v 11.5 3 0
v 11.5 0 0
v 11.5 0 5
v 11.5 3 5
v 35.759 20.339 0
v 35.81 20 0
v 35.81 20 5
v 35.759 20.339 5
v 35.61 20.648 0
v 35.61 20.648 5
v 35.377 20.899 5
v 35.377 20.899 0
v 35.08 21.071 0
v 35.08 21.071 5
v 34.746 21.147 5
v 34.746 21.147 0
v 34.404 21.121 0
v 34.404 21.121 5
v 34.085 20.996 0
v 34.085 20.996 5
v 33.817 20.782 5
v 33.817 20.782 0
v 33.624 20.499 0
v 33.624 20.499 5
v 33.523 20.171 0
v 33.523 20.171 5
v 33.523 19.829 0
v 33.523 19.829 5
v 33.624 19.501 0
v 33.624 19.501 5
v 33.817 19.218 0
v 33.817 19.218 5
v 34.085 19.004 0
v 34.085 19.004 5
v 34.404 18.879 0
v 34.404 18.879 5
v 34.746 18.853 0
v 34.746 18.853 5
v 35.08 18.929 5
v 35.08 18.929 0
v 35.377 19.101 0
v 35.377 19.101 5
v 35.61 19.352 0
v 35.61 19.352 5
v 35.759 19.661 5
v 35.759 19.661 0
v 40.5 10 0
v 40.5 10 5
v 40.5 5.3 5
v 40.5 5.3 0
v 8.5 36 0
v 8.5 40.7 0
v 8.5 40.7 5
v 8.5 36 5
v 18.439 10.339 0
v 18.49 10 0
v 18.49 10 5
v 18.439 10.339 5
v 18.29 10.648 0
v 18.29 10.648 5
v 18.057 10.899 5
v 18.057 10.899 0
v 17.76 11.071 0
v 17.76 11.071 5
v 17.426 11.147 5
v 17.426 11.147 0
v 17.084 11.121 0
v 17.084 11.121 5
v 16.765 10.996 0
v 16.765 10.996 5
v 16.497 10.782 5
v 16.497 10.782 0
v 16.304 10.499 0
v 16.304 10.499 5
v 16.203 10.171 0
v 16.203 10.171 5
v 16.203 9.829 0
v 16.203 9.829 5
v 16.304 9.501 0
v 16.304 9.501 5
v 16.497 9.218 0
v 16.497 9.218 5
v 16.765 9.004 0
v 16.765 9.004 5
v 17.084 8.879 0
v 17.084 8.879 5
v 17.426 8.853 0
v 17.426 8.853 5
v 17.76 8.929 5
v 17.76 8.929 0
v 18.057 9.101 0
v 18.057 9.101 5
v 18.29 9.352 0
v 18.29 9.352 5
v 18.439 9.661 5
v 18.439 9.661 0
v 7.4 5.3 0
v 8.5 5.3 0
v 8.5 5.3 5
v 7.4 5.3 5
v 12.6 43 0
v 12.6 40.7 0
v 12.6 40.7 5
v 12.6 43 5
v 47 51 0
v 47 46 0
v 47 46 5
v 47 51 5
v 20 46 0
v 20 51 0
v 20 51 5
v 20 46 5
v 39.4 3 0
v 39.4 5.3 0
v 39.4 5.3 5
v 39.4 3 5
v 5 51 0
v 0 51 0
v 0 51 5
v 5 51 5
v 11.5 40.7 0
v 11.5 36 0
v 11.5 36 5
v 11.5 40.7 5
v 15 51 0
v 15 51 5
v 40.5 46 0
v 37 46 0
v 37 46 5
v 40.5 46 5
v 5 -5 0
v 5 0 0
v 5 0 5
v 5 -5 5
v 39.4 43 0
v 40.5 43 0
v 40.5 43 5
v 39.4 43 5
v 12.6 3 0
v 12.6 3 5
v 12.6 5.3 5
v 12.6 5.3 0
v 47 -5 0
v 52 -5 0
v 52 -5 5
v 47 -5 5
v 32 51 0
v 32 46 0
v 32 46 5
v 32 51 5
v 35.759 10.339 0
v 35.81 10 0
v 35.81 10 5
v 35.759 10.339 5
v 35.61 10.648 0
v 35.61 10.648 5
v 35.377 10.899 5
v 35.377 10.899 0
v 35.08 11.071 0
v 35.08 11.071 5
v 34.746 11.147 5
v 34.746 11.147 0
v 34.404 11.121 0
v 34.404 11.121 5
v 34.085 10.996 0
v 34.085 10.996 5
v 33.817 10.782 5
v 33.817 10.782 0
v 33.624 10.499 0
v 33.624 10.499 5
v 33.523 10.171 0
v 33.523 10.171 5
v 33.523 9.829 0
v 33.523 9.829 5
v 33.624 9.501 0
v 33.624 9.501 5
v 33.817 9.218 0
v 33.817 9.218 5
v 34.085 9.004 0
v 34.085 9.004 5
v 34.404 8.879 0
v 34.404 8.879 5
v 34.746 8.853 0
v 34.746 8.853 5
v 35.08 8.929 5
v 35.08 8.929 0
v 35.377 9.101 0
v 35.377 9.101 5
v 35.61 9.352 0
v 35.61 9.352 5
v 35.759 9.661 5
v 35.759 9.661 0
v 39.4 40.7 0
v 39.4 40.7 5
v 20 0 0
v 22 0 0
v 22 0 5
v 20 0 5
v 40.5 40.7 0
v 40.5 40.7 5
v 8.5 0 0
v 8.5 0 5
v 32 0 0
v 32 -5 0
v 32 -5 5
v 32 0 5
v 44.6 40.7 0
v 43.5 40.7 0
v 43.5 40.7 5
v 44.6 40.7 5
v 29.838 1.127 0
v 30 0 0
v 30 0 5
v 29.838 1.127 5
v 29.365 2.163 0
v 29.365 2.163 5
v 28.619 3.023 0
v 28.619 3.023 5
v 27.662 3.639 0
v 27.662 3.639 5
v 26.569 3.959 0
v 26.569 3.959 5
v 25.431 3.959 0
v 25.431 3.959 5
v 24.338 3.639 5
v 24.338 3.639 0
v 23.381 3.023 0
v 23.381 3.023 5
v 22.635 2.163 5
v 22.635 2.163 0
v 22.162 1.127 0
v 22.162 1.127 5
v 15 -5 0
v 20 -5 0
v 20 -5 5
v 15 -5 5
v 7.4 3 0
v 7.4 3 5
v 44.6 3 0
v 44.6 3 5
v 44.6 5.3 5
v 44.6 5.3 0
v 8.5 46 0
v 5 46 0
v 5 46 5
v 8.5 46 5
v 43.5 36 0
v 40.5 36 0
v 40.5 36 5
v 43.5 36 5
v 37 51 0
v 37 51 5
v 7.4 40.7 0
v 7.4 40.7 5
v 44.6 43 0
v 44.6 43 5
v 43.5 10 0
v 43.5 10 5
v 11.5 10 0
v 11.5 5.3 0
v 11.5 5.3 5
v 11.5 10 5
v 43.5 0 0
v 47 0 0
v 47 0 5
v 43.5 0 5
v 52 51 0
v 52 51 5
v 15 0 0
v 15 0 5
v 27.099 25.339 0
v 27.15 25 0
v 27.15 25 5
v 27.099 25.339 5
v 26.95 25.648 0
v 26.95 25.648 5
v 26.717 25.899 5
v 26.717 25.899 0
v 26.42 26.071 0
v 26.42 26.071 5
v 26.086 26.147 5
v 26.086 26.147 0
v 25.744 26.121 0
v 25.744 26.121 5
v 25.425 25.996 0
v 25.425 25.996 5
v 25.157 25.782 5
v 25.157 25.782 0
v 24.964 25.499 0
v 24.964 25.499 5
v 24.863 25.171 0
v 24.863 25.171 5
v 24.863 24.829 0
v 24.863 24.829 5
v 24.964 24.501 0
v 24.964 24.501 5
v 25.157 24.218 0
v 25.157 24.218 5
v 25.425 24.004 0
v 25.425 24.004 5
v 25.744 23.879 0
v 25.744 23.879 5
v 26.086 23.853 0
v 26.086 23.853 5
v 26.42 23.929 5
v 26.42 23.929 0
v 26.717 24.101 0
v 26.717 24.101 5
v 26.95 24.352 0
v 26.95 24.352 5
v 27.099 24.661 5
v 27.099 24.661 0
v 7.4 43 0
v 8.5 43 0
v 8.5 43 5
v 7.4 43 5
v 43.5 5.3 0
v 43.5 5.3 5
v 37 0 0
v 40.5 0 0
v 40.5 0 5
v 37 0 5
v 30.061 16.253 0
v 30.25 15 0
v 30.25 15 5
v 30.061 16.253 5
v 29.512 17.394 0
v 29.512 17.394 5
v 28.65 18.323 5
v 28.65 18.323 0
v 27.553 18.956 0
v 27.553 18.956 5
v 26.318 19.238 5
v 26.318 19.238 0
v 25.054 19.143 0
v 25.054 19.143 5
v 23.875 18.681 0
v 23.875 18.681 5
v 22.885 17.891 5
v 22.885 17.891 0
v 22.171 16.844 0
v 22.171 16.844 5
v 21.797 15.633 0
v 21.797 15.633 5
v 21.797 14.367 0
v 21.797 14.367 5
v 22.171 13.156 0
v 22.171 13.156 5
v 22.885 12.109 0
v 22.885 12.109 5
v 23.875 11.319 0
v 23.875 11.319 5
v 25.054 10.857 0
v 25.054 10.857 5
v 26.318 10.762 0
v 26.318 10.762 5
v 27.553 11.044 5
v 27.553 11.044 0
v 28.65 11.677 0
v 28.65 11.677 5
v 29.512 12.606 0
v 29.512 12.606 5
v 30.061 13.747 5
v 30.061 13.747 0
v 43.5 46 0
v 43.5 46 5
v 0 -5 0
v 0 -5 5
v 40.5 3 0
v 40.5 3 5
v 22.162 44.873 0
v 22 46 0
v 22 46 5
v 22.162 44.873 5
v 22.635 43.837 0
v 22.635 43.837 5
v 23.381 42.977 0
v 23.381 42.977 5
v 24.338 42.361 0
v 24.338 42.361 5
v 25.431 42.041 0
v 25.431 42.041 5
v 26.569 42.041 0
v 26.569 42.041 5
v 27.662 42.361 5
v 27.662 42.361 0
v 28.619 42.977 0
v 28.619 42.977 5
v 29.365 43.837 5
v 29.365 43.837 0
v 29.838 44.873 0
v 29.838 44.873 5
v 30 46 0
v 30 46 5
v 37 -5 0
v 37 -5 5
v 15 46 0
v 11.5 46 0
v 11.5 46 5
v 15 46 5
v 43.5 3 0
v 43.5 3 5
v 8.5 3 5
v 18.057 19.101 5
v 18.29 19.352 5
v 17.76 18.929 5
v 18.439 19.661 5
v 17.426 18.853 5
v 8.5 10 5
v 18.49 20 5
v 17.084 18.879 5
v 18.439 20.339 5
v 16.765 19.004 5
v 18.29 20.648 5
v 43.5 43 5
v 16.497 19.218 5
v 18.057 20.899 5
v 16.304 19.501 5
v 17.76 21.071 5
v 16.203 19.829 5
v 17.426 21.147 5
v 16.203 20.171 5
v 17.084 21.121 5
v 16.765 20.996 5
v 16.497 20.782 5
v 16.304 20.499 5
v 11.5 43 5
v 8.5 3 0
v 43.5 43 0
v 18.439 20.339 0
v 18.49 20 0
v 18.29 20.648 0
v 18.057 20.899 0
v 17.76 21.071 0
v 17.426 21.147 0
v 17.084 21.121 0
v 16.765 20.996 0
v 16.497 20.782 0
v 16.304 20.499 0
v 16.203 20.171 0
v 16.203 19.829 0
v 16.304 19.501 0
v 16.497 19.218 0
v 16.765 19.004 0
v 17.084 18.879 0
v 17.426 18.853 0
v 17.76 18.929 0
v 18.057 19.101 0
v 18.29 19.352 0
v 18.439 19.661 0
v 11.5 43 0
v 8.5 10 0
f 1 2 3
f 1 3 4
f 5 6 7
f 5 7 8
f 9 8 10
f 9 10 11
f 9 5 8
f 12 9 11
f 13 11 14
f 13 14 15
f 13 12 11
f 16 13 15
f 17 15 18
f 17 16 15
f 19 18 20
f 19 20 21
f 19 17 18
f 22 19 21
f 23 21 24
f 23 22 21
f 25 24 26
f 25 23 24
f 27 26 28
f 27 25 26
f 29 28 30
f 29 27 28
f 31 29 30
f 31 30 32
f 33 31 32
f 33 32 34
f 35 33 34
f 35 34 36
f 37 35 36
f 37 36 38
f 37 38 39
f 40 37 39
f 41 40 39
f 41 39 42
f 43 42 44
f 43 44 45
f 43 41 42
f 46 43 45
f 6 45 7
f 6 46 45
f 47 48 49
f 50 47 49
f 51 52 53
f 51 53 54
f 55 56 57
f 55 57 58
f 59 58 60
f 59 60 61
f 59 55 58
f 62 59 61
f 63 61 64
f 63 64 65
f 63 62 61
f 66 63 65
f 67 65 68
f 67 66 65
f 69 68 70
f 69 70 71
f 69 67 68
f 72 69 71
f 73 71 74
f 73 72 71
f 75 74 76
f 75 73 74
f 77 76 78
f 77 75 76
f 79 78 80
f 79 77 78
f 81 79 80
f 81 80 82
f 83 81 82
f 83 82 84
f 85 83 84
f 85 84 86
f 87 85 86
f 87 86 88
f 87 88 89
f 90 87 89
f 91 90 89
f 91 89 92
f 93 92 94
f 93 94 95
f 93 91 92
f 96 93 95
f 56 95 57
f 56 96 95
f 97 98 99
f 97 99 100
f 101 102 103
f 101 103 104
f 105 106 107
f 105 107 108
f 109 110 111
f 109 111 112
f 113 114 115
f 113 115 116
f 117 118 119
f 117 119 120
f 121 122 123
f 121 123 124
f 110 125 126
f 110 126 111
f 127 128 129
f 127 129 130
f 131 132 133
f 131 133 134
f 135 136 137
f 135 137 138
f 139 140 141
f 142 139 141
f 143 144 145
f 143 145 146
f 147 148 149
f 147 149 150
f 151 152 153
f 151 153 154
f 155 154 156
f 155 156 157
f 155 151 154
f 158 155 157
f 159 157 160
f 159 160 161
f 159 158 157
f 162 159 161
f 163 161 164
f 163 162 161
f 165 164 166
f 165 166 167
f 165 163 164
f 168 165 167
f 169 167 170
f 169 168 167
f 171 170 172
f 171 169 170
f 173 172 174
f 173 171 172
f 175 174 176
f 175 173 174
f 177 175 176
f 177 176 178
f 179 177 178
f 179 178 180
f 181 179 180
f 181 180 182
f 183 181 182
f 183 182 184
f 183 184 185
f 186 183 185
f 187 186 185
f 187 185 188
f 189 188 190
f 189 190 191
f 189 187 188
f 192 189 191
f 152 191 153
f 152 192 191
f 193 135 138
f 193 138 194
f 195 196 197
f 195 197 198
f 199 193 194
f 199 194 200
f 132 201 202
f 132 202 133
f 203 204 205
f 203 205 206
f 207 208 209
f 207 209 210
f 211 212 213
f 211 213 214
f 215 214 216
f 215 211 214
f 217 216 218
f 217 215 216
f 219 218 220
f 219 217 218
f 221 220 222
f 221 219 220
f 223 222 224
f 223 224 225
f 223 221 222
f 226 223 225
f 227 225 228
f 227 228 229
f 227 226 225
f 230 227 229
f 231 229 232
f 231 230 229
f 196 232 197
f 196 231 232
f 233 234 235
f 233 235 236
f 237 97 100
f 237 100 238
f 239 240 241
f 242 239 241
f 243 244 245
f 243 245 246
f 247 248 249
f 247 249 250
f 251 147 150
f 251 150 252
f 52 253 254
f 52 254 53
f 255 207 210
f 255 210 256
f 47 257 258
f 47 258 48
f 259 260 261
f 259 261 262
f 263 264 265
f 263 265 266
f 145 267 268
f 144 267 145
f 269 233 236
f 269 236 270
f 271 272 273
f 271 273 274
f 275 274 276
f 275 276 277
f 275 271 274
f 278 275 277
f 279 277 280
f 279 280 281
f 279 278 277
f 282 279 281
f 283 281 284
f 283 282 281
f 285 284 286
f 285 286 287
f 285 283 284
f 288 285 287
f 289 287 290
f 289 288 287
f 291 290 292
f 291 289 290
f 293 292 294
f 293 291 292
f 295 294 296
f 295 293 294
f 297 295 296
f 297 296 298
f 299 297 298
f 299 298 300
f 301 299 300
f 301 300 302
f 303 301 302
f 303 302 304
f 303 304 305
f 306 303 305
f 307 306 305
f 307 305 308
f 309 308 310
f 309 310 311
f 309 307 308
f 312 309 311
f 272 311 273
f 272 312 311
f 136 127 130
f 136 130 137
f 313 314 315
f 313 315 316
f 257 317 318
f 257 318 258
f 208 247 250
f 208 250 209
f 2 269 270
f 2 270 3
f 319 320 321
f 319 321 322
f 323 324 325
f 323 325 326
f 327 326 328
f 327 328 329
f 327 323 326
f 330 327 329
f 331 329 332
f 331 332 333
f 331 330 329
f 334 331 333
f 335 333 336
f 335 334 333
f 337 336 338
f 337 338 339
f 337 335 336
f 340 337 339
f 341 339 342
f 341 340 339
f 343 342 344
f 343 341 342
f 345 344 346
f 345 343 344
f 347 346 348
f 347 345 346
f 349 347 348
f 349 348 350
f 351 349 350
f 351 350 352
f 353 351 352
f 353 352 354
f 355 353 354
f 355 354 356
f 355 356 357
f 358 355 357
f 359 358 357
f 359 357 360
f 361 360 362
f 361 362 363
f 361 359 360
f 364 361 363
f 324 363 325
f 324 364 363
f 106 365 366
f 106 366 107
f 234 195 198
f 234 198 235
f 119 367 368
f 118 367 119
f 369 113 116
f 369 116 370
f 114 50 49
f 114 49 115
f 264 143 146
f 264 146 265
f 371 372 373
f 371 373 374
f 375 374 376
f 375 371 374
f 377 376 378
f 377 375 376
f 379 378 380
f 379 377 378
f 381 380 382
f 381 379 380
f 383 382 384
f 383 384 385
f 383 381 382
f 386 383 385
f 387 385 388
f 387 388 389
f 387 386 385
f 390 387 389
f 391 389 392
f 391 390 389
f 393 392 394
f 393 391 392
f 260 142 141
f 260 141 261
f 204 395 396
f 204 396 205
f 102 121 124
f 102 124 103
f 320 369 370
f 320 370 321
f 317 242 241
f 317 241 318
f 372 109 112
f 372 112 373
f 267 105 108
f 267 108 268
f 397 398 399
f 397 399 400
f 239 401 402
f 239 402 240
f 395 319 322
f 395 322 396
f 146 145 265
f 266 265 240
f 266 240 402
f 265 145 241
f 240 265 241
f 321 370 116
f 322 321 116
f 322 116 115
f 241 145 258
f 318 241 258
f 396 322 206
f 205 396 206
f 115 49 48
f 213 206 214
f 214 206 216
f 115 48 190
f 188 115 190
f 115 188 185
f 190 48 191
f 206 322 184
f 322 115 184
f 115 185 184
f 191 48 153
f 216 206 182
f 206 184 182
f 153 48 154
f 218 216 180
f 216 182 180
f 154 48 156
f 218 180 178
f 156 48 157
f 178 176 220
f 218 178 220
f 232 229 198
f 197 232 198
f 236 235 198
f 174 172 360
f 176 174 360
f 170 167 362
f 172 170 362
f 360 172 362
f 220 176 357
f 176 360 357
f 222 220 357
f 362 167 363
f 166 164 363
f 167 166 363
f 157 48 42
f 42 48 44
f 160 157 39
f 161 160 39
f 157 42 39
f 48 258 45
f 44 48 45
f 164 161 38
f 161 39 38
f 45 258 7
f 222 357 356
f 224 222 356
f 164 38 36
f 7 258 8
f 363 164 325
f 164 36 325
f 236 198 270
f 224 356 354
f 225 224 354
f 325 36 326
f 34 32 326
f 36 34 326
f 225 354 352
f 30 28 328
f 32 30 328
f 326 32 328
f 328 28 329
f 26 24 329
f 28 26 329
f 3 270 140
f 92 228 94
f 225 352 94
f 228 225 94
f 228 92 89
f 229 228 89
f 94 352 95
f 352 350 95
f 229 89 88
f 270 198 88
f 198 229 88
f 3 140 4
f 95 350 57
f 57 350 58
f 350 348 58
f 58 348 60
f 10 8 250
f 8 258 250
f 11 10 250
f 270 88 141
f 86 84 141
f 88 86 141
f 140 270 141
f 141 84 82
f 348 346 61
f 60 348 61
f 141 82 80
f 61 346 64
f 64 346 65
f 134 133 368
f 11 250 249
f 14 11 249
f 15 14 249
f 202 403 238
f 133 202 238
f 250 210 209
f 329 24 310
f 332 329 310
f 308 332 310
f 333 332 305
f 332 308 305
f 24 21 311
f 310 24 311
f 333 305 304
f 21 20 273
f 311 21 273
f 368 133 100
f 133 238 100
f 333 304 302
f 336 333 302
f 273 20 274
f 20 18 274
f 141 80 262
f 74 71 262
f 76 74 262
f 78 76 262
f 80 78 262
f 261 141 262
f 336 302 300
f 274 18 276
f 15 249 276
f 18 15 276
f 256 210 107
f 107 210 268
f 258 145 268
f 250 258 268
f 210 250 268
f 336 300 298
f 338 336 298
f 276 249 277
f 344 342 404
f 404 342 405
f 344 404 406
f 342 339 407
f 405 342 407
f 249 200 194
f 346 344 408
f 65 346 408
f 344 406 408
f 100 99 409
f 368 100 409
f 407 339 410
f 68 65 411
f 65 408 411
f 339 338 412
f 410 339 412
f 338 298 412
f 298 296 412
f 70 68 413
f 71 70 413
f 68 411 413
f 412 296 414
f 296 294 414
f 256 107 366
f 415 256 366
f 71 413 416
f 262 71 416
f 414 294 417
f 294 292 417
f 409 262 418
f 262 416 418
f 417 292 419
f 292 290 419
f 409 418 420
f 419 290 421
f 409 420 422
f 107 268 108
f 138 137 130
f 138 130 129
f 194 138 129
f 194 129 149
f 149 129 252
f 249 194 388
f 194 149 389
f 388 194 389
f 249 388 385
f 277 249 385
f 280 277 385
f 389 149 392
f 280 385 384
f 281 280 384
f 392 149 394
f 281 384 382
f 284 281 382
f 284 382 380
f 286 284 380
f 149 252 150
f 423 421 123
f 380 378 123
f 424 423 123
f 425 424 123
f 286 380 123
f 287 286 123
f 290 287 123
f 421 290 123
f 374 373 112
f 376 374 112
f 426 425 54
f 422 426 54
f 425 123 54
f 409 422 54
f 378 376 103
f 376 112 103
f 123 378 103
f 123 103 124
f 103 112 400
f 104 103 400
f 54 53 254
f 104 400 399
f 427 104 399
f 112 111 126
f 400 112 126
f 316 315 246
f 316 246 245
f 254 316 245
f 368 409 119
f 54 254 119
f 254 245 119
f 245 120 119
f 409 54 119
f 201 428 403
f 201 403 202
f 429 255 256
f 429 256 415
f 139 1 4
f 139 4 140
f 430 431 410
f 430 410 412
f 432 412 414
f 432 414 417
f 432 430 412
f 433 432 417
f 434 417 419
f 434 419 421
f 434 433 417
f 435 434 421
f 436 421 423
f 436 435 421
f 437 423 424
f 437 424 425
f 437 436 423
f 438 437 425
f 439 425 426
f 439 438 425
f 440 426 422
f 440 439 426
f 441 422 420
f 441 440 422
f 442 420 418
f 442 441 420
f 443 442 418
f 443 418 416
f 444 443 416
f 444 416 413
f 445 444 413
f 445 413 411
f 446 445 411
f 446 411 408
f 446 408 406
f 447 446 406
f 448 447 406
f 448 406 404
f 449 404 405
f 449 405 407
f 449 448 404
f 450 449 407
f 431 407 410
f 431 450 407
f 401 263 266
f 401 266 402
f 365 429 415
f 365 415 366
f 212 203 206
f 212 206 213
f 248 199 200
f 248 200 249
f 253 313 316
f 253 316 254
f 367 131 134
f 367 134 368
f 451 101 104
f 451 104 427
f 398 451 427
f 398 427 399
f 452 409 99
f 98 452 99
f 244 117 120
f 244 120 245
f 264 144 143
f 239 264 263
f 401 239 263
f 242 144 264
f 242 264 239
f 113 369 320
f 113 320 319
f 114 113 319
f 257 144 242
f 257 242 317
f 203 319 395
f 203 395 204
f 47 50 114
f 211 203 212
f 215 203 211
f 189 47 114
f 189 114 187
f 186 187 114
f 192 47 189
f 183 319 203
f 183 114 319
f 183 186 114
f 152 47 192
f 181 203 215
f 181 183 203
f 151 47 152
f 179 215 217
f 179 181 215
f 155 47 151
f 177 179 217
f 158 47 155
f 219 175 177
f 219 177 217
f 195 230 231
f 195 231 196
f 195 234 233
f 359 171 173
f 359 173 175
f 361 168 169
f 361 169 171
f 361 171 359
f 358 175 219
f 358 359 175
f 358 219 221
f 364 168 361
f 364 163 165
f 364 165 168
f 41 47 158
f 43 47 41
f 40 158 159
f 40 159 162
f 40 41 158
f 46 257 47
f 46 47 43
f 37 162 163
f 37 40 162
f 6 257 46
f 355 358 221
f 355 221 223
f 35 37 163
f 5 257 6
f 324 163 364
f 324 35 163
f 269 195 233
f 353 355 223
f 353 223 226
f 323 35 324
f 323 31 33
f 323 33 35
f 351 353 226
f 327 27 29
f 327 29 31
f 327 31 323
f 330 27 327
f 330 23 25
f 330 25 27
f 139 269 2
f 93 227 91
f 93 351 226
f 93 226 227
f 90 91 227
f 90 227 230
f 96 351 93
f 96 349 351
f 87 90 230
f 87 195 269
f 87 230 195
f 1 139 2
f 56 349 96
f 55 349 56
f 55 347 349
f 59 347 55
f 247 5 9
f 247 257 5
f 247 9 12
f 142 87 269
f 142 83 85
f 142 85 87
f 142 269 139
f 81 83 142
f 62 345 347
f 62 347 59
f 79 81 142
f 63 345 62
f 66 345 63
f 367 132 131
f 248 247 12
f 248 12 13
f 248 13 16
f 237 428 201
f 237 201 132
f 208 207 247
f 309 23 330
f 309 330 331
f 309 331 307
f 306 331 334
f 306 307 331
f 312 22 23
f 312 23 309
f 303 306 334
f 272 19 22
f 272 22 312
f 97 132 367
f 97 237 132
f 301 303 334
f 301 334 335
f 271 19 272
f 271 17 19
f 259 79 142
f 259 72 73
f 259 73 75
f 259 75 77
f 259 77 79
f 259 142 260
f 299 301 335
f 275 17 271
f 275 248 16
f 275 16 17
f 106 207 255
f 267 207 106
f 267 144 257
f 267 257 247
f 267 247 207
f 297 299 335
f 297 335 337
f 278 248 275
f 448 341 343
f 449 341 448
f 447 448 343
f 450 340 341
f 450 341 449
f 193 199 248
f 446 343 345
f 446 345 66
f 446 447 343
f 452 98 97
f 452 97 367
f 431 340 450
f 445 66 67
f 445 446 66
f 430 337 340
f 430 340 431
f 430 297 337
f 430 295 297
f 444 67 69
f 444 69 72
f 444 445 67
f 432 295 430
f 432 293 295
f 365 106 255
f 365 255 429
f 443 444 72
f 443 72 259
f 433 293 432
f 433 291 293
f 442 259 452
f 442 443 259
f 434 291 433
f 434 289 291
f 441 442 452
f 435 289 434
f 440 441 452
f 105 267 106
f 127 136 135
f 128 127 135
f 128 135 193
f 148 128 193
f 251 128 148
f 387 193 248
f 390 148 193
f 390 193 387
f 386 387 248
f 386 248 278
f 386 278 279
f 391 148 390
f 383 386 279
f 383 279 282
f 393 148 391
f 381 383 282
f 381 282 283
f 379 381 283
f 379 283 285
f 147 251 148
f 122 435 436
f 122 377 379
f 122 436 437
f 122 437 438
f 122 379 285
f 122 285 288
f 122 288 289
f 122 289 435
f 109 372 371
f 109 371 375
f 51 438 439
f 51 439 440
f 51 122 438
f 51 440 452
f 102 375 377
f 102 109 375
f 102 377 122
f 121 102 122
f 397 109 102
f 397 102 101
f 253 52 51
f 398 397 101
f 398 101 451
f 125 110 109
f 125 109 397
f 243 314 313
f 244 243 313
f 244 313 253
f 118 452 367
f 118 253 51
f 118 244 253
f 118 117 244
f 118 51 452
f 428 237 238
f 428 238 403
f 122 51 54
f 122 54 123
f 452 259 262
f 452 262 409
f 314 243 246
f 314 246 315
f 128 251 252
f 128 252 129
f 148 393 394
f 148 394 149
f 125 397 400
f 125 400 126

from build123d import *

# Parameters (mm, degrees)
SKETCH1_R           = 4.25
SKETCH1_R_2         = 1.15
BOSS_EXTRUDE1_DEPTH = 5


with BuildPart() as part:
    # Sketch1 → Boss-Extrude1 (new body)
    with BuildSketch(Plane.XY):
        with BuildLine():
            Line((11.5, 46), (15, 46))
            Line((15, 46), (15, 51))
            Line((15, 51), (20, 51))
            Line((20, 51), (20, 46))
            Line((20, 46), (22, 46))
            ThreePointArc((22, 46), (26, 42), (30, 46))
            Line((30, 46), (32, 46))
            Line((32, 46), (32, 51))
            Line((32, 51), (37, 51))
            Line((37, 51), (37, 46))
            Line((37, 46), (40.5, 46))
            Line((40.5, 46), (40.5, 43))
            Line((40.5, 43), (39.4, 43))
            Line((39.4, 43), (39.4, 40.7))
            Line((39.4, 40.7), (40.5, 40.7))
            Line((40.5, 40.7), (40.5, 36))
            Line((40.5, 36), (43.5, 36))
            Line((43.5, 36), (43.5, 40.7))
            Line((43.5, 40.7), (44.6, 40.7))
            Line((44.6, 40.7), (44.6, 43))
            Line((44.6, 43), (43.5, 43))
            Line((43.5, 43), (43.5, 46))
            Line((43.5, 46), (47, 46))
            Line((47, 46), (47, 51))
            Line((47, 51), (52, 51))
            Line((52, 51), (52, 0))
            Line((52, 0), (52, -5))
            Line((52, -5), (47, -5))
            Line((47, -5), (47, 0))
            Line((47, 0), (43.5, 0))
            Line((43.5, 0), (43.5, 3))
            Line((43.5, 3), (44.6, 3))
            Line((44.6, 3), (44.6, 5.3))
            Line((44.6, 5.3), (43.5, 5.3))
            Line((43.5, 5.3), (43.5, 10))
            Line((43.5, 10), (40.5, 10))
            Line((40.5, 10), (40.5, 5.3))
            Line((40.5, 5.3), (39.4, 5.3))
            Line((39.4, 5.3), (39.4, 3))
            Line((39.4, 3), (40.5, 3))
            Line((40.5, 3), (40.5, 0))
            Line((40.5, 0), (37, 0))
            Line((37, 0), (37, -5))
            Line((37, -5), (32, -5))
            Line((32, -5), (32, 0))
            Line((32, 0), (30, 0))
            ThreePointArc((30, 0), (26, 4), (22, 0))
            Line((22, 0), (20, 0))
            Line((20, 0), (20, -5))
            Line((20, -5), (15, -5))
            Line((15, -5), (15, 0))
            Line((15, 0), (11.5, 0))
            Line((11.5, 0), (11.5, 3))
            Line((11.5, 3), (12.6, 3))
            Line((12.6, 3), (12.6, 5.3))
            Line((12.6, 5.3), (11.5, 5.3))
            Line((11.5, 5.3), (11.5, 10))
            Line((11.5, 10), (8.5, 10))
            Line((8.5, 10), (8.5, 5.3))
            Line((8.5, 5.3), (7.4, 5.3))
            Line((7.4, 5.3), (7.4, 3))
            Line((7.4, 3), (8.5, 3))
            Line((8.5, 3), (8.5, 0))
            Line((8.5, 0), (5, 0))
            Line((5, 0), (5, -5))
            Line((5, -5), (0, -5))
            Line((0, -5), (0, 0))
            Line((0, 0), (0, 51))
            Line((0, 51), (5, 51))
            Line((5, 51), (5, 46))
            Line((5, 46), (8.5, 46))
            Line((8.5, 46), (8.5, 43))
            Line((8.5, 43), (7.4, 43))
            Line((7.4, 43), (7.4, 40.7))
            Line((7.4, 40.7), (8.5, 40.7))
            Line((8.5, 40.7), (8.5, 36))
            Line((8.5, 36), (11.5, 36))
            Line((11.5, 36), (11.5, 40.7))
            Line((11.5, 40.7), (12.6, 40.7))
            Line((12.6, 40.7), (12.6, 43))
            Line((12.6, 43), (11.5, 43))
            Line((11.5, 43), (11.5, 46))
        make_face()
        with Locations((26, 15)):
            Circle(SKETCH1_R, mode=Mode.SUBTRACT)
        with Locations((26, 25)):
            Circle(SKETCH1_R_2, mode=Mode.SUBTRACT)
        with Locations((34.660254038, 20)):
            Circle(SKETCH1_R_2, mode=Mode.SUBTRACT)
        with Locations((34.660254038, 10)):
            Circle(SKETCH1_R_2, mode=Mode.SUBTRACT)
        with Locations((17.339745962, 10)):
            Circle(SKETCH1_R_2, mode=Mode.SUBTRACT)
        with Locations((17.339745962, 20)):
            Circle(SKETCH1_R_2, mode=Mode.SUBTRACT)
    extrude(amount=BOSS_EXTRUDE1_DEPTH)


solid = part.part
